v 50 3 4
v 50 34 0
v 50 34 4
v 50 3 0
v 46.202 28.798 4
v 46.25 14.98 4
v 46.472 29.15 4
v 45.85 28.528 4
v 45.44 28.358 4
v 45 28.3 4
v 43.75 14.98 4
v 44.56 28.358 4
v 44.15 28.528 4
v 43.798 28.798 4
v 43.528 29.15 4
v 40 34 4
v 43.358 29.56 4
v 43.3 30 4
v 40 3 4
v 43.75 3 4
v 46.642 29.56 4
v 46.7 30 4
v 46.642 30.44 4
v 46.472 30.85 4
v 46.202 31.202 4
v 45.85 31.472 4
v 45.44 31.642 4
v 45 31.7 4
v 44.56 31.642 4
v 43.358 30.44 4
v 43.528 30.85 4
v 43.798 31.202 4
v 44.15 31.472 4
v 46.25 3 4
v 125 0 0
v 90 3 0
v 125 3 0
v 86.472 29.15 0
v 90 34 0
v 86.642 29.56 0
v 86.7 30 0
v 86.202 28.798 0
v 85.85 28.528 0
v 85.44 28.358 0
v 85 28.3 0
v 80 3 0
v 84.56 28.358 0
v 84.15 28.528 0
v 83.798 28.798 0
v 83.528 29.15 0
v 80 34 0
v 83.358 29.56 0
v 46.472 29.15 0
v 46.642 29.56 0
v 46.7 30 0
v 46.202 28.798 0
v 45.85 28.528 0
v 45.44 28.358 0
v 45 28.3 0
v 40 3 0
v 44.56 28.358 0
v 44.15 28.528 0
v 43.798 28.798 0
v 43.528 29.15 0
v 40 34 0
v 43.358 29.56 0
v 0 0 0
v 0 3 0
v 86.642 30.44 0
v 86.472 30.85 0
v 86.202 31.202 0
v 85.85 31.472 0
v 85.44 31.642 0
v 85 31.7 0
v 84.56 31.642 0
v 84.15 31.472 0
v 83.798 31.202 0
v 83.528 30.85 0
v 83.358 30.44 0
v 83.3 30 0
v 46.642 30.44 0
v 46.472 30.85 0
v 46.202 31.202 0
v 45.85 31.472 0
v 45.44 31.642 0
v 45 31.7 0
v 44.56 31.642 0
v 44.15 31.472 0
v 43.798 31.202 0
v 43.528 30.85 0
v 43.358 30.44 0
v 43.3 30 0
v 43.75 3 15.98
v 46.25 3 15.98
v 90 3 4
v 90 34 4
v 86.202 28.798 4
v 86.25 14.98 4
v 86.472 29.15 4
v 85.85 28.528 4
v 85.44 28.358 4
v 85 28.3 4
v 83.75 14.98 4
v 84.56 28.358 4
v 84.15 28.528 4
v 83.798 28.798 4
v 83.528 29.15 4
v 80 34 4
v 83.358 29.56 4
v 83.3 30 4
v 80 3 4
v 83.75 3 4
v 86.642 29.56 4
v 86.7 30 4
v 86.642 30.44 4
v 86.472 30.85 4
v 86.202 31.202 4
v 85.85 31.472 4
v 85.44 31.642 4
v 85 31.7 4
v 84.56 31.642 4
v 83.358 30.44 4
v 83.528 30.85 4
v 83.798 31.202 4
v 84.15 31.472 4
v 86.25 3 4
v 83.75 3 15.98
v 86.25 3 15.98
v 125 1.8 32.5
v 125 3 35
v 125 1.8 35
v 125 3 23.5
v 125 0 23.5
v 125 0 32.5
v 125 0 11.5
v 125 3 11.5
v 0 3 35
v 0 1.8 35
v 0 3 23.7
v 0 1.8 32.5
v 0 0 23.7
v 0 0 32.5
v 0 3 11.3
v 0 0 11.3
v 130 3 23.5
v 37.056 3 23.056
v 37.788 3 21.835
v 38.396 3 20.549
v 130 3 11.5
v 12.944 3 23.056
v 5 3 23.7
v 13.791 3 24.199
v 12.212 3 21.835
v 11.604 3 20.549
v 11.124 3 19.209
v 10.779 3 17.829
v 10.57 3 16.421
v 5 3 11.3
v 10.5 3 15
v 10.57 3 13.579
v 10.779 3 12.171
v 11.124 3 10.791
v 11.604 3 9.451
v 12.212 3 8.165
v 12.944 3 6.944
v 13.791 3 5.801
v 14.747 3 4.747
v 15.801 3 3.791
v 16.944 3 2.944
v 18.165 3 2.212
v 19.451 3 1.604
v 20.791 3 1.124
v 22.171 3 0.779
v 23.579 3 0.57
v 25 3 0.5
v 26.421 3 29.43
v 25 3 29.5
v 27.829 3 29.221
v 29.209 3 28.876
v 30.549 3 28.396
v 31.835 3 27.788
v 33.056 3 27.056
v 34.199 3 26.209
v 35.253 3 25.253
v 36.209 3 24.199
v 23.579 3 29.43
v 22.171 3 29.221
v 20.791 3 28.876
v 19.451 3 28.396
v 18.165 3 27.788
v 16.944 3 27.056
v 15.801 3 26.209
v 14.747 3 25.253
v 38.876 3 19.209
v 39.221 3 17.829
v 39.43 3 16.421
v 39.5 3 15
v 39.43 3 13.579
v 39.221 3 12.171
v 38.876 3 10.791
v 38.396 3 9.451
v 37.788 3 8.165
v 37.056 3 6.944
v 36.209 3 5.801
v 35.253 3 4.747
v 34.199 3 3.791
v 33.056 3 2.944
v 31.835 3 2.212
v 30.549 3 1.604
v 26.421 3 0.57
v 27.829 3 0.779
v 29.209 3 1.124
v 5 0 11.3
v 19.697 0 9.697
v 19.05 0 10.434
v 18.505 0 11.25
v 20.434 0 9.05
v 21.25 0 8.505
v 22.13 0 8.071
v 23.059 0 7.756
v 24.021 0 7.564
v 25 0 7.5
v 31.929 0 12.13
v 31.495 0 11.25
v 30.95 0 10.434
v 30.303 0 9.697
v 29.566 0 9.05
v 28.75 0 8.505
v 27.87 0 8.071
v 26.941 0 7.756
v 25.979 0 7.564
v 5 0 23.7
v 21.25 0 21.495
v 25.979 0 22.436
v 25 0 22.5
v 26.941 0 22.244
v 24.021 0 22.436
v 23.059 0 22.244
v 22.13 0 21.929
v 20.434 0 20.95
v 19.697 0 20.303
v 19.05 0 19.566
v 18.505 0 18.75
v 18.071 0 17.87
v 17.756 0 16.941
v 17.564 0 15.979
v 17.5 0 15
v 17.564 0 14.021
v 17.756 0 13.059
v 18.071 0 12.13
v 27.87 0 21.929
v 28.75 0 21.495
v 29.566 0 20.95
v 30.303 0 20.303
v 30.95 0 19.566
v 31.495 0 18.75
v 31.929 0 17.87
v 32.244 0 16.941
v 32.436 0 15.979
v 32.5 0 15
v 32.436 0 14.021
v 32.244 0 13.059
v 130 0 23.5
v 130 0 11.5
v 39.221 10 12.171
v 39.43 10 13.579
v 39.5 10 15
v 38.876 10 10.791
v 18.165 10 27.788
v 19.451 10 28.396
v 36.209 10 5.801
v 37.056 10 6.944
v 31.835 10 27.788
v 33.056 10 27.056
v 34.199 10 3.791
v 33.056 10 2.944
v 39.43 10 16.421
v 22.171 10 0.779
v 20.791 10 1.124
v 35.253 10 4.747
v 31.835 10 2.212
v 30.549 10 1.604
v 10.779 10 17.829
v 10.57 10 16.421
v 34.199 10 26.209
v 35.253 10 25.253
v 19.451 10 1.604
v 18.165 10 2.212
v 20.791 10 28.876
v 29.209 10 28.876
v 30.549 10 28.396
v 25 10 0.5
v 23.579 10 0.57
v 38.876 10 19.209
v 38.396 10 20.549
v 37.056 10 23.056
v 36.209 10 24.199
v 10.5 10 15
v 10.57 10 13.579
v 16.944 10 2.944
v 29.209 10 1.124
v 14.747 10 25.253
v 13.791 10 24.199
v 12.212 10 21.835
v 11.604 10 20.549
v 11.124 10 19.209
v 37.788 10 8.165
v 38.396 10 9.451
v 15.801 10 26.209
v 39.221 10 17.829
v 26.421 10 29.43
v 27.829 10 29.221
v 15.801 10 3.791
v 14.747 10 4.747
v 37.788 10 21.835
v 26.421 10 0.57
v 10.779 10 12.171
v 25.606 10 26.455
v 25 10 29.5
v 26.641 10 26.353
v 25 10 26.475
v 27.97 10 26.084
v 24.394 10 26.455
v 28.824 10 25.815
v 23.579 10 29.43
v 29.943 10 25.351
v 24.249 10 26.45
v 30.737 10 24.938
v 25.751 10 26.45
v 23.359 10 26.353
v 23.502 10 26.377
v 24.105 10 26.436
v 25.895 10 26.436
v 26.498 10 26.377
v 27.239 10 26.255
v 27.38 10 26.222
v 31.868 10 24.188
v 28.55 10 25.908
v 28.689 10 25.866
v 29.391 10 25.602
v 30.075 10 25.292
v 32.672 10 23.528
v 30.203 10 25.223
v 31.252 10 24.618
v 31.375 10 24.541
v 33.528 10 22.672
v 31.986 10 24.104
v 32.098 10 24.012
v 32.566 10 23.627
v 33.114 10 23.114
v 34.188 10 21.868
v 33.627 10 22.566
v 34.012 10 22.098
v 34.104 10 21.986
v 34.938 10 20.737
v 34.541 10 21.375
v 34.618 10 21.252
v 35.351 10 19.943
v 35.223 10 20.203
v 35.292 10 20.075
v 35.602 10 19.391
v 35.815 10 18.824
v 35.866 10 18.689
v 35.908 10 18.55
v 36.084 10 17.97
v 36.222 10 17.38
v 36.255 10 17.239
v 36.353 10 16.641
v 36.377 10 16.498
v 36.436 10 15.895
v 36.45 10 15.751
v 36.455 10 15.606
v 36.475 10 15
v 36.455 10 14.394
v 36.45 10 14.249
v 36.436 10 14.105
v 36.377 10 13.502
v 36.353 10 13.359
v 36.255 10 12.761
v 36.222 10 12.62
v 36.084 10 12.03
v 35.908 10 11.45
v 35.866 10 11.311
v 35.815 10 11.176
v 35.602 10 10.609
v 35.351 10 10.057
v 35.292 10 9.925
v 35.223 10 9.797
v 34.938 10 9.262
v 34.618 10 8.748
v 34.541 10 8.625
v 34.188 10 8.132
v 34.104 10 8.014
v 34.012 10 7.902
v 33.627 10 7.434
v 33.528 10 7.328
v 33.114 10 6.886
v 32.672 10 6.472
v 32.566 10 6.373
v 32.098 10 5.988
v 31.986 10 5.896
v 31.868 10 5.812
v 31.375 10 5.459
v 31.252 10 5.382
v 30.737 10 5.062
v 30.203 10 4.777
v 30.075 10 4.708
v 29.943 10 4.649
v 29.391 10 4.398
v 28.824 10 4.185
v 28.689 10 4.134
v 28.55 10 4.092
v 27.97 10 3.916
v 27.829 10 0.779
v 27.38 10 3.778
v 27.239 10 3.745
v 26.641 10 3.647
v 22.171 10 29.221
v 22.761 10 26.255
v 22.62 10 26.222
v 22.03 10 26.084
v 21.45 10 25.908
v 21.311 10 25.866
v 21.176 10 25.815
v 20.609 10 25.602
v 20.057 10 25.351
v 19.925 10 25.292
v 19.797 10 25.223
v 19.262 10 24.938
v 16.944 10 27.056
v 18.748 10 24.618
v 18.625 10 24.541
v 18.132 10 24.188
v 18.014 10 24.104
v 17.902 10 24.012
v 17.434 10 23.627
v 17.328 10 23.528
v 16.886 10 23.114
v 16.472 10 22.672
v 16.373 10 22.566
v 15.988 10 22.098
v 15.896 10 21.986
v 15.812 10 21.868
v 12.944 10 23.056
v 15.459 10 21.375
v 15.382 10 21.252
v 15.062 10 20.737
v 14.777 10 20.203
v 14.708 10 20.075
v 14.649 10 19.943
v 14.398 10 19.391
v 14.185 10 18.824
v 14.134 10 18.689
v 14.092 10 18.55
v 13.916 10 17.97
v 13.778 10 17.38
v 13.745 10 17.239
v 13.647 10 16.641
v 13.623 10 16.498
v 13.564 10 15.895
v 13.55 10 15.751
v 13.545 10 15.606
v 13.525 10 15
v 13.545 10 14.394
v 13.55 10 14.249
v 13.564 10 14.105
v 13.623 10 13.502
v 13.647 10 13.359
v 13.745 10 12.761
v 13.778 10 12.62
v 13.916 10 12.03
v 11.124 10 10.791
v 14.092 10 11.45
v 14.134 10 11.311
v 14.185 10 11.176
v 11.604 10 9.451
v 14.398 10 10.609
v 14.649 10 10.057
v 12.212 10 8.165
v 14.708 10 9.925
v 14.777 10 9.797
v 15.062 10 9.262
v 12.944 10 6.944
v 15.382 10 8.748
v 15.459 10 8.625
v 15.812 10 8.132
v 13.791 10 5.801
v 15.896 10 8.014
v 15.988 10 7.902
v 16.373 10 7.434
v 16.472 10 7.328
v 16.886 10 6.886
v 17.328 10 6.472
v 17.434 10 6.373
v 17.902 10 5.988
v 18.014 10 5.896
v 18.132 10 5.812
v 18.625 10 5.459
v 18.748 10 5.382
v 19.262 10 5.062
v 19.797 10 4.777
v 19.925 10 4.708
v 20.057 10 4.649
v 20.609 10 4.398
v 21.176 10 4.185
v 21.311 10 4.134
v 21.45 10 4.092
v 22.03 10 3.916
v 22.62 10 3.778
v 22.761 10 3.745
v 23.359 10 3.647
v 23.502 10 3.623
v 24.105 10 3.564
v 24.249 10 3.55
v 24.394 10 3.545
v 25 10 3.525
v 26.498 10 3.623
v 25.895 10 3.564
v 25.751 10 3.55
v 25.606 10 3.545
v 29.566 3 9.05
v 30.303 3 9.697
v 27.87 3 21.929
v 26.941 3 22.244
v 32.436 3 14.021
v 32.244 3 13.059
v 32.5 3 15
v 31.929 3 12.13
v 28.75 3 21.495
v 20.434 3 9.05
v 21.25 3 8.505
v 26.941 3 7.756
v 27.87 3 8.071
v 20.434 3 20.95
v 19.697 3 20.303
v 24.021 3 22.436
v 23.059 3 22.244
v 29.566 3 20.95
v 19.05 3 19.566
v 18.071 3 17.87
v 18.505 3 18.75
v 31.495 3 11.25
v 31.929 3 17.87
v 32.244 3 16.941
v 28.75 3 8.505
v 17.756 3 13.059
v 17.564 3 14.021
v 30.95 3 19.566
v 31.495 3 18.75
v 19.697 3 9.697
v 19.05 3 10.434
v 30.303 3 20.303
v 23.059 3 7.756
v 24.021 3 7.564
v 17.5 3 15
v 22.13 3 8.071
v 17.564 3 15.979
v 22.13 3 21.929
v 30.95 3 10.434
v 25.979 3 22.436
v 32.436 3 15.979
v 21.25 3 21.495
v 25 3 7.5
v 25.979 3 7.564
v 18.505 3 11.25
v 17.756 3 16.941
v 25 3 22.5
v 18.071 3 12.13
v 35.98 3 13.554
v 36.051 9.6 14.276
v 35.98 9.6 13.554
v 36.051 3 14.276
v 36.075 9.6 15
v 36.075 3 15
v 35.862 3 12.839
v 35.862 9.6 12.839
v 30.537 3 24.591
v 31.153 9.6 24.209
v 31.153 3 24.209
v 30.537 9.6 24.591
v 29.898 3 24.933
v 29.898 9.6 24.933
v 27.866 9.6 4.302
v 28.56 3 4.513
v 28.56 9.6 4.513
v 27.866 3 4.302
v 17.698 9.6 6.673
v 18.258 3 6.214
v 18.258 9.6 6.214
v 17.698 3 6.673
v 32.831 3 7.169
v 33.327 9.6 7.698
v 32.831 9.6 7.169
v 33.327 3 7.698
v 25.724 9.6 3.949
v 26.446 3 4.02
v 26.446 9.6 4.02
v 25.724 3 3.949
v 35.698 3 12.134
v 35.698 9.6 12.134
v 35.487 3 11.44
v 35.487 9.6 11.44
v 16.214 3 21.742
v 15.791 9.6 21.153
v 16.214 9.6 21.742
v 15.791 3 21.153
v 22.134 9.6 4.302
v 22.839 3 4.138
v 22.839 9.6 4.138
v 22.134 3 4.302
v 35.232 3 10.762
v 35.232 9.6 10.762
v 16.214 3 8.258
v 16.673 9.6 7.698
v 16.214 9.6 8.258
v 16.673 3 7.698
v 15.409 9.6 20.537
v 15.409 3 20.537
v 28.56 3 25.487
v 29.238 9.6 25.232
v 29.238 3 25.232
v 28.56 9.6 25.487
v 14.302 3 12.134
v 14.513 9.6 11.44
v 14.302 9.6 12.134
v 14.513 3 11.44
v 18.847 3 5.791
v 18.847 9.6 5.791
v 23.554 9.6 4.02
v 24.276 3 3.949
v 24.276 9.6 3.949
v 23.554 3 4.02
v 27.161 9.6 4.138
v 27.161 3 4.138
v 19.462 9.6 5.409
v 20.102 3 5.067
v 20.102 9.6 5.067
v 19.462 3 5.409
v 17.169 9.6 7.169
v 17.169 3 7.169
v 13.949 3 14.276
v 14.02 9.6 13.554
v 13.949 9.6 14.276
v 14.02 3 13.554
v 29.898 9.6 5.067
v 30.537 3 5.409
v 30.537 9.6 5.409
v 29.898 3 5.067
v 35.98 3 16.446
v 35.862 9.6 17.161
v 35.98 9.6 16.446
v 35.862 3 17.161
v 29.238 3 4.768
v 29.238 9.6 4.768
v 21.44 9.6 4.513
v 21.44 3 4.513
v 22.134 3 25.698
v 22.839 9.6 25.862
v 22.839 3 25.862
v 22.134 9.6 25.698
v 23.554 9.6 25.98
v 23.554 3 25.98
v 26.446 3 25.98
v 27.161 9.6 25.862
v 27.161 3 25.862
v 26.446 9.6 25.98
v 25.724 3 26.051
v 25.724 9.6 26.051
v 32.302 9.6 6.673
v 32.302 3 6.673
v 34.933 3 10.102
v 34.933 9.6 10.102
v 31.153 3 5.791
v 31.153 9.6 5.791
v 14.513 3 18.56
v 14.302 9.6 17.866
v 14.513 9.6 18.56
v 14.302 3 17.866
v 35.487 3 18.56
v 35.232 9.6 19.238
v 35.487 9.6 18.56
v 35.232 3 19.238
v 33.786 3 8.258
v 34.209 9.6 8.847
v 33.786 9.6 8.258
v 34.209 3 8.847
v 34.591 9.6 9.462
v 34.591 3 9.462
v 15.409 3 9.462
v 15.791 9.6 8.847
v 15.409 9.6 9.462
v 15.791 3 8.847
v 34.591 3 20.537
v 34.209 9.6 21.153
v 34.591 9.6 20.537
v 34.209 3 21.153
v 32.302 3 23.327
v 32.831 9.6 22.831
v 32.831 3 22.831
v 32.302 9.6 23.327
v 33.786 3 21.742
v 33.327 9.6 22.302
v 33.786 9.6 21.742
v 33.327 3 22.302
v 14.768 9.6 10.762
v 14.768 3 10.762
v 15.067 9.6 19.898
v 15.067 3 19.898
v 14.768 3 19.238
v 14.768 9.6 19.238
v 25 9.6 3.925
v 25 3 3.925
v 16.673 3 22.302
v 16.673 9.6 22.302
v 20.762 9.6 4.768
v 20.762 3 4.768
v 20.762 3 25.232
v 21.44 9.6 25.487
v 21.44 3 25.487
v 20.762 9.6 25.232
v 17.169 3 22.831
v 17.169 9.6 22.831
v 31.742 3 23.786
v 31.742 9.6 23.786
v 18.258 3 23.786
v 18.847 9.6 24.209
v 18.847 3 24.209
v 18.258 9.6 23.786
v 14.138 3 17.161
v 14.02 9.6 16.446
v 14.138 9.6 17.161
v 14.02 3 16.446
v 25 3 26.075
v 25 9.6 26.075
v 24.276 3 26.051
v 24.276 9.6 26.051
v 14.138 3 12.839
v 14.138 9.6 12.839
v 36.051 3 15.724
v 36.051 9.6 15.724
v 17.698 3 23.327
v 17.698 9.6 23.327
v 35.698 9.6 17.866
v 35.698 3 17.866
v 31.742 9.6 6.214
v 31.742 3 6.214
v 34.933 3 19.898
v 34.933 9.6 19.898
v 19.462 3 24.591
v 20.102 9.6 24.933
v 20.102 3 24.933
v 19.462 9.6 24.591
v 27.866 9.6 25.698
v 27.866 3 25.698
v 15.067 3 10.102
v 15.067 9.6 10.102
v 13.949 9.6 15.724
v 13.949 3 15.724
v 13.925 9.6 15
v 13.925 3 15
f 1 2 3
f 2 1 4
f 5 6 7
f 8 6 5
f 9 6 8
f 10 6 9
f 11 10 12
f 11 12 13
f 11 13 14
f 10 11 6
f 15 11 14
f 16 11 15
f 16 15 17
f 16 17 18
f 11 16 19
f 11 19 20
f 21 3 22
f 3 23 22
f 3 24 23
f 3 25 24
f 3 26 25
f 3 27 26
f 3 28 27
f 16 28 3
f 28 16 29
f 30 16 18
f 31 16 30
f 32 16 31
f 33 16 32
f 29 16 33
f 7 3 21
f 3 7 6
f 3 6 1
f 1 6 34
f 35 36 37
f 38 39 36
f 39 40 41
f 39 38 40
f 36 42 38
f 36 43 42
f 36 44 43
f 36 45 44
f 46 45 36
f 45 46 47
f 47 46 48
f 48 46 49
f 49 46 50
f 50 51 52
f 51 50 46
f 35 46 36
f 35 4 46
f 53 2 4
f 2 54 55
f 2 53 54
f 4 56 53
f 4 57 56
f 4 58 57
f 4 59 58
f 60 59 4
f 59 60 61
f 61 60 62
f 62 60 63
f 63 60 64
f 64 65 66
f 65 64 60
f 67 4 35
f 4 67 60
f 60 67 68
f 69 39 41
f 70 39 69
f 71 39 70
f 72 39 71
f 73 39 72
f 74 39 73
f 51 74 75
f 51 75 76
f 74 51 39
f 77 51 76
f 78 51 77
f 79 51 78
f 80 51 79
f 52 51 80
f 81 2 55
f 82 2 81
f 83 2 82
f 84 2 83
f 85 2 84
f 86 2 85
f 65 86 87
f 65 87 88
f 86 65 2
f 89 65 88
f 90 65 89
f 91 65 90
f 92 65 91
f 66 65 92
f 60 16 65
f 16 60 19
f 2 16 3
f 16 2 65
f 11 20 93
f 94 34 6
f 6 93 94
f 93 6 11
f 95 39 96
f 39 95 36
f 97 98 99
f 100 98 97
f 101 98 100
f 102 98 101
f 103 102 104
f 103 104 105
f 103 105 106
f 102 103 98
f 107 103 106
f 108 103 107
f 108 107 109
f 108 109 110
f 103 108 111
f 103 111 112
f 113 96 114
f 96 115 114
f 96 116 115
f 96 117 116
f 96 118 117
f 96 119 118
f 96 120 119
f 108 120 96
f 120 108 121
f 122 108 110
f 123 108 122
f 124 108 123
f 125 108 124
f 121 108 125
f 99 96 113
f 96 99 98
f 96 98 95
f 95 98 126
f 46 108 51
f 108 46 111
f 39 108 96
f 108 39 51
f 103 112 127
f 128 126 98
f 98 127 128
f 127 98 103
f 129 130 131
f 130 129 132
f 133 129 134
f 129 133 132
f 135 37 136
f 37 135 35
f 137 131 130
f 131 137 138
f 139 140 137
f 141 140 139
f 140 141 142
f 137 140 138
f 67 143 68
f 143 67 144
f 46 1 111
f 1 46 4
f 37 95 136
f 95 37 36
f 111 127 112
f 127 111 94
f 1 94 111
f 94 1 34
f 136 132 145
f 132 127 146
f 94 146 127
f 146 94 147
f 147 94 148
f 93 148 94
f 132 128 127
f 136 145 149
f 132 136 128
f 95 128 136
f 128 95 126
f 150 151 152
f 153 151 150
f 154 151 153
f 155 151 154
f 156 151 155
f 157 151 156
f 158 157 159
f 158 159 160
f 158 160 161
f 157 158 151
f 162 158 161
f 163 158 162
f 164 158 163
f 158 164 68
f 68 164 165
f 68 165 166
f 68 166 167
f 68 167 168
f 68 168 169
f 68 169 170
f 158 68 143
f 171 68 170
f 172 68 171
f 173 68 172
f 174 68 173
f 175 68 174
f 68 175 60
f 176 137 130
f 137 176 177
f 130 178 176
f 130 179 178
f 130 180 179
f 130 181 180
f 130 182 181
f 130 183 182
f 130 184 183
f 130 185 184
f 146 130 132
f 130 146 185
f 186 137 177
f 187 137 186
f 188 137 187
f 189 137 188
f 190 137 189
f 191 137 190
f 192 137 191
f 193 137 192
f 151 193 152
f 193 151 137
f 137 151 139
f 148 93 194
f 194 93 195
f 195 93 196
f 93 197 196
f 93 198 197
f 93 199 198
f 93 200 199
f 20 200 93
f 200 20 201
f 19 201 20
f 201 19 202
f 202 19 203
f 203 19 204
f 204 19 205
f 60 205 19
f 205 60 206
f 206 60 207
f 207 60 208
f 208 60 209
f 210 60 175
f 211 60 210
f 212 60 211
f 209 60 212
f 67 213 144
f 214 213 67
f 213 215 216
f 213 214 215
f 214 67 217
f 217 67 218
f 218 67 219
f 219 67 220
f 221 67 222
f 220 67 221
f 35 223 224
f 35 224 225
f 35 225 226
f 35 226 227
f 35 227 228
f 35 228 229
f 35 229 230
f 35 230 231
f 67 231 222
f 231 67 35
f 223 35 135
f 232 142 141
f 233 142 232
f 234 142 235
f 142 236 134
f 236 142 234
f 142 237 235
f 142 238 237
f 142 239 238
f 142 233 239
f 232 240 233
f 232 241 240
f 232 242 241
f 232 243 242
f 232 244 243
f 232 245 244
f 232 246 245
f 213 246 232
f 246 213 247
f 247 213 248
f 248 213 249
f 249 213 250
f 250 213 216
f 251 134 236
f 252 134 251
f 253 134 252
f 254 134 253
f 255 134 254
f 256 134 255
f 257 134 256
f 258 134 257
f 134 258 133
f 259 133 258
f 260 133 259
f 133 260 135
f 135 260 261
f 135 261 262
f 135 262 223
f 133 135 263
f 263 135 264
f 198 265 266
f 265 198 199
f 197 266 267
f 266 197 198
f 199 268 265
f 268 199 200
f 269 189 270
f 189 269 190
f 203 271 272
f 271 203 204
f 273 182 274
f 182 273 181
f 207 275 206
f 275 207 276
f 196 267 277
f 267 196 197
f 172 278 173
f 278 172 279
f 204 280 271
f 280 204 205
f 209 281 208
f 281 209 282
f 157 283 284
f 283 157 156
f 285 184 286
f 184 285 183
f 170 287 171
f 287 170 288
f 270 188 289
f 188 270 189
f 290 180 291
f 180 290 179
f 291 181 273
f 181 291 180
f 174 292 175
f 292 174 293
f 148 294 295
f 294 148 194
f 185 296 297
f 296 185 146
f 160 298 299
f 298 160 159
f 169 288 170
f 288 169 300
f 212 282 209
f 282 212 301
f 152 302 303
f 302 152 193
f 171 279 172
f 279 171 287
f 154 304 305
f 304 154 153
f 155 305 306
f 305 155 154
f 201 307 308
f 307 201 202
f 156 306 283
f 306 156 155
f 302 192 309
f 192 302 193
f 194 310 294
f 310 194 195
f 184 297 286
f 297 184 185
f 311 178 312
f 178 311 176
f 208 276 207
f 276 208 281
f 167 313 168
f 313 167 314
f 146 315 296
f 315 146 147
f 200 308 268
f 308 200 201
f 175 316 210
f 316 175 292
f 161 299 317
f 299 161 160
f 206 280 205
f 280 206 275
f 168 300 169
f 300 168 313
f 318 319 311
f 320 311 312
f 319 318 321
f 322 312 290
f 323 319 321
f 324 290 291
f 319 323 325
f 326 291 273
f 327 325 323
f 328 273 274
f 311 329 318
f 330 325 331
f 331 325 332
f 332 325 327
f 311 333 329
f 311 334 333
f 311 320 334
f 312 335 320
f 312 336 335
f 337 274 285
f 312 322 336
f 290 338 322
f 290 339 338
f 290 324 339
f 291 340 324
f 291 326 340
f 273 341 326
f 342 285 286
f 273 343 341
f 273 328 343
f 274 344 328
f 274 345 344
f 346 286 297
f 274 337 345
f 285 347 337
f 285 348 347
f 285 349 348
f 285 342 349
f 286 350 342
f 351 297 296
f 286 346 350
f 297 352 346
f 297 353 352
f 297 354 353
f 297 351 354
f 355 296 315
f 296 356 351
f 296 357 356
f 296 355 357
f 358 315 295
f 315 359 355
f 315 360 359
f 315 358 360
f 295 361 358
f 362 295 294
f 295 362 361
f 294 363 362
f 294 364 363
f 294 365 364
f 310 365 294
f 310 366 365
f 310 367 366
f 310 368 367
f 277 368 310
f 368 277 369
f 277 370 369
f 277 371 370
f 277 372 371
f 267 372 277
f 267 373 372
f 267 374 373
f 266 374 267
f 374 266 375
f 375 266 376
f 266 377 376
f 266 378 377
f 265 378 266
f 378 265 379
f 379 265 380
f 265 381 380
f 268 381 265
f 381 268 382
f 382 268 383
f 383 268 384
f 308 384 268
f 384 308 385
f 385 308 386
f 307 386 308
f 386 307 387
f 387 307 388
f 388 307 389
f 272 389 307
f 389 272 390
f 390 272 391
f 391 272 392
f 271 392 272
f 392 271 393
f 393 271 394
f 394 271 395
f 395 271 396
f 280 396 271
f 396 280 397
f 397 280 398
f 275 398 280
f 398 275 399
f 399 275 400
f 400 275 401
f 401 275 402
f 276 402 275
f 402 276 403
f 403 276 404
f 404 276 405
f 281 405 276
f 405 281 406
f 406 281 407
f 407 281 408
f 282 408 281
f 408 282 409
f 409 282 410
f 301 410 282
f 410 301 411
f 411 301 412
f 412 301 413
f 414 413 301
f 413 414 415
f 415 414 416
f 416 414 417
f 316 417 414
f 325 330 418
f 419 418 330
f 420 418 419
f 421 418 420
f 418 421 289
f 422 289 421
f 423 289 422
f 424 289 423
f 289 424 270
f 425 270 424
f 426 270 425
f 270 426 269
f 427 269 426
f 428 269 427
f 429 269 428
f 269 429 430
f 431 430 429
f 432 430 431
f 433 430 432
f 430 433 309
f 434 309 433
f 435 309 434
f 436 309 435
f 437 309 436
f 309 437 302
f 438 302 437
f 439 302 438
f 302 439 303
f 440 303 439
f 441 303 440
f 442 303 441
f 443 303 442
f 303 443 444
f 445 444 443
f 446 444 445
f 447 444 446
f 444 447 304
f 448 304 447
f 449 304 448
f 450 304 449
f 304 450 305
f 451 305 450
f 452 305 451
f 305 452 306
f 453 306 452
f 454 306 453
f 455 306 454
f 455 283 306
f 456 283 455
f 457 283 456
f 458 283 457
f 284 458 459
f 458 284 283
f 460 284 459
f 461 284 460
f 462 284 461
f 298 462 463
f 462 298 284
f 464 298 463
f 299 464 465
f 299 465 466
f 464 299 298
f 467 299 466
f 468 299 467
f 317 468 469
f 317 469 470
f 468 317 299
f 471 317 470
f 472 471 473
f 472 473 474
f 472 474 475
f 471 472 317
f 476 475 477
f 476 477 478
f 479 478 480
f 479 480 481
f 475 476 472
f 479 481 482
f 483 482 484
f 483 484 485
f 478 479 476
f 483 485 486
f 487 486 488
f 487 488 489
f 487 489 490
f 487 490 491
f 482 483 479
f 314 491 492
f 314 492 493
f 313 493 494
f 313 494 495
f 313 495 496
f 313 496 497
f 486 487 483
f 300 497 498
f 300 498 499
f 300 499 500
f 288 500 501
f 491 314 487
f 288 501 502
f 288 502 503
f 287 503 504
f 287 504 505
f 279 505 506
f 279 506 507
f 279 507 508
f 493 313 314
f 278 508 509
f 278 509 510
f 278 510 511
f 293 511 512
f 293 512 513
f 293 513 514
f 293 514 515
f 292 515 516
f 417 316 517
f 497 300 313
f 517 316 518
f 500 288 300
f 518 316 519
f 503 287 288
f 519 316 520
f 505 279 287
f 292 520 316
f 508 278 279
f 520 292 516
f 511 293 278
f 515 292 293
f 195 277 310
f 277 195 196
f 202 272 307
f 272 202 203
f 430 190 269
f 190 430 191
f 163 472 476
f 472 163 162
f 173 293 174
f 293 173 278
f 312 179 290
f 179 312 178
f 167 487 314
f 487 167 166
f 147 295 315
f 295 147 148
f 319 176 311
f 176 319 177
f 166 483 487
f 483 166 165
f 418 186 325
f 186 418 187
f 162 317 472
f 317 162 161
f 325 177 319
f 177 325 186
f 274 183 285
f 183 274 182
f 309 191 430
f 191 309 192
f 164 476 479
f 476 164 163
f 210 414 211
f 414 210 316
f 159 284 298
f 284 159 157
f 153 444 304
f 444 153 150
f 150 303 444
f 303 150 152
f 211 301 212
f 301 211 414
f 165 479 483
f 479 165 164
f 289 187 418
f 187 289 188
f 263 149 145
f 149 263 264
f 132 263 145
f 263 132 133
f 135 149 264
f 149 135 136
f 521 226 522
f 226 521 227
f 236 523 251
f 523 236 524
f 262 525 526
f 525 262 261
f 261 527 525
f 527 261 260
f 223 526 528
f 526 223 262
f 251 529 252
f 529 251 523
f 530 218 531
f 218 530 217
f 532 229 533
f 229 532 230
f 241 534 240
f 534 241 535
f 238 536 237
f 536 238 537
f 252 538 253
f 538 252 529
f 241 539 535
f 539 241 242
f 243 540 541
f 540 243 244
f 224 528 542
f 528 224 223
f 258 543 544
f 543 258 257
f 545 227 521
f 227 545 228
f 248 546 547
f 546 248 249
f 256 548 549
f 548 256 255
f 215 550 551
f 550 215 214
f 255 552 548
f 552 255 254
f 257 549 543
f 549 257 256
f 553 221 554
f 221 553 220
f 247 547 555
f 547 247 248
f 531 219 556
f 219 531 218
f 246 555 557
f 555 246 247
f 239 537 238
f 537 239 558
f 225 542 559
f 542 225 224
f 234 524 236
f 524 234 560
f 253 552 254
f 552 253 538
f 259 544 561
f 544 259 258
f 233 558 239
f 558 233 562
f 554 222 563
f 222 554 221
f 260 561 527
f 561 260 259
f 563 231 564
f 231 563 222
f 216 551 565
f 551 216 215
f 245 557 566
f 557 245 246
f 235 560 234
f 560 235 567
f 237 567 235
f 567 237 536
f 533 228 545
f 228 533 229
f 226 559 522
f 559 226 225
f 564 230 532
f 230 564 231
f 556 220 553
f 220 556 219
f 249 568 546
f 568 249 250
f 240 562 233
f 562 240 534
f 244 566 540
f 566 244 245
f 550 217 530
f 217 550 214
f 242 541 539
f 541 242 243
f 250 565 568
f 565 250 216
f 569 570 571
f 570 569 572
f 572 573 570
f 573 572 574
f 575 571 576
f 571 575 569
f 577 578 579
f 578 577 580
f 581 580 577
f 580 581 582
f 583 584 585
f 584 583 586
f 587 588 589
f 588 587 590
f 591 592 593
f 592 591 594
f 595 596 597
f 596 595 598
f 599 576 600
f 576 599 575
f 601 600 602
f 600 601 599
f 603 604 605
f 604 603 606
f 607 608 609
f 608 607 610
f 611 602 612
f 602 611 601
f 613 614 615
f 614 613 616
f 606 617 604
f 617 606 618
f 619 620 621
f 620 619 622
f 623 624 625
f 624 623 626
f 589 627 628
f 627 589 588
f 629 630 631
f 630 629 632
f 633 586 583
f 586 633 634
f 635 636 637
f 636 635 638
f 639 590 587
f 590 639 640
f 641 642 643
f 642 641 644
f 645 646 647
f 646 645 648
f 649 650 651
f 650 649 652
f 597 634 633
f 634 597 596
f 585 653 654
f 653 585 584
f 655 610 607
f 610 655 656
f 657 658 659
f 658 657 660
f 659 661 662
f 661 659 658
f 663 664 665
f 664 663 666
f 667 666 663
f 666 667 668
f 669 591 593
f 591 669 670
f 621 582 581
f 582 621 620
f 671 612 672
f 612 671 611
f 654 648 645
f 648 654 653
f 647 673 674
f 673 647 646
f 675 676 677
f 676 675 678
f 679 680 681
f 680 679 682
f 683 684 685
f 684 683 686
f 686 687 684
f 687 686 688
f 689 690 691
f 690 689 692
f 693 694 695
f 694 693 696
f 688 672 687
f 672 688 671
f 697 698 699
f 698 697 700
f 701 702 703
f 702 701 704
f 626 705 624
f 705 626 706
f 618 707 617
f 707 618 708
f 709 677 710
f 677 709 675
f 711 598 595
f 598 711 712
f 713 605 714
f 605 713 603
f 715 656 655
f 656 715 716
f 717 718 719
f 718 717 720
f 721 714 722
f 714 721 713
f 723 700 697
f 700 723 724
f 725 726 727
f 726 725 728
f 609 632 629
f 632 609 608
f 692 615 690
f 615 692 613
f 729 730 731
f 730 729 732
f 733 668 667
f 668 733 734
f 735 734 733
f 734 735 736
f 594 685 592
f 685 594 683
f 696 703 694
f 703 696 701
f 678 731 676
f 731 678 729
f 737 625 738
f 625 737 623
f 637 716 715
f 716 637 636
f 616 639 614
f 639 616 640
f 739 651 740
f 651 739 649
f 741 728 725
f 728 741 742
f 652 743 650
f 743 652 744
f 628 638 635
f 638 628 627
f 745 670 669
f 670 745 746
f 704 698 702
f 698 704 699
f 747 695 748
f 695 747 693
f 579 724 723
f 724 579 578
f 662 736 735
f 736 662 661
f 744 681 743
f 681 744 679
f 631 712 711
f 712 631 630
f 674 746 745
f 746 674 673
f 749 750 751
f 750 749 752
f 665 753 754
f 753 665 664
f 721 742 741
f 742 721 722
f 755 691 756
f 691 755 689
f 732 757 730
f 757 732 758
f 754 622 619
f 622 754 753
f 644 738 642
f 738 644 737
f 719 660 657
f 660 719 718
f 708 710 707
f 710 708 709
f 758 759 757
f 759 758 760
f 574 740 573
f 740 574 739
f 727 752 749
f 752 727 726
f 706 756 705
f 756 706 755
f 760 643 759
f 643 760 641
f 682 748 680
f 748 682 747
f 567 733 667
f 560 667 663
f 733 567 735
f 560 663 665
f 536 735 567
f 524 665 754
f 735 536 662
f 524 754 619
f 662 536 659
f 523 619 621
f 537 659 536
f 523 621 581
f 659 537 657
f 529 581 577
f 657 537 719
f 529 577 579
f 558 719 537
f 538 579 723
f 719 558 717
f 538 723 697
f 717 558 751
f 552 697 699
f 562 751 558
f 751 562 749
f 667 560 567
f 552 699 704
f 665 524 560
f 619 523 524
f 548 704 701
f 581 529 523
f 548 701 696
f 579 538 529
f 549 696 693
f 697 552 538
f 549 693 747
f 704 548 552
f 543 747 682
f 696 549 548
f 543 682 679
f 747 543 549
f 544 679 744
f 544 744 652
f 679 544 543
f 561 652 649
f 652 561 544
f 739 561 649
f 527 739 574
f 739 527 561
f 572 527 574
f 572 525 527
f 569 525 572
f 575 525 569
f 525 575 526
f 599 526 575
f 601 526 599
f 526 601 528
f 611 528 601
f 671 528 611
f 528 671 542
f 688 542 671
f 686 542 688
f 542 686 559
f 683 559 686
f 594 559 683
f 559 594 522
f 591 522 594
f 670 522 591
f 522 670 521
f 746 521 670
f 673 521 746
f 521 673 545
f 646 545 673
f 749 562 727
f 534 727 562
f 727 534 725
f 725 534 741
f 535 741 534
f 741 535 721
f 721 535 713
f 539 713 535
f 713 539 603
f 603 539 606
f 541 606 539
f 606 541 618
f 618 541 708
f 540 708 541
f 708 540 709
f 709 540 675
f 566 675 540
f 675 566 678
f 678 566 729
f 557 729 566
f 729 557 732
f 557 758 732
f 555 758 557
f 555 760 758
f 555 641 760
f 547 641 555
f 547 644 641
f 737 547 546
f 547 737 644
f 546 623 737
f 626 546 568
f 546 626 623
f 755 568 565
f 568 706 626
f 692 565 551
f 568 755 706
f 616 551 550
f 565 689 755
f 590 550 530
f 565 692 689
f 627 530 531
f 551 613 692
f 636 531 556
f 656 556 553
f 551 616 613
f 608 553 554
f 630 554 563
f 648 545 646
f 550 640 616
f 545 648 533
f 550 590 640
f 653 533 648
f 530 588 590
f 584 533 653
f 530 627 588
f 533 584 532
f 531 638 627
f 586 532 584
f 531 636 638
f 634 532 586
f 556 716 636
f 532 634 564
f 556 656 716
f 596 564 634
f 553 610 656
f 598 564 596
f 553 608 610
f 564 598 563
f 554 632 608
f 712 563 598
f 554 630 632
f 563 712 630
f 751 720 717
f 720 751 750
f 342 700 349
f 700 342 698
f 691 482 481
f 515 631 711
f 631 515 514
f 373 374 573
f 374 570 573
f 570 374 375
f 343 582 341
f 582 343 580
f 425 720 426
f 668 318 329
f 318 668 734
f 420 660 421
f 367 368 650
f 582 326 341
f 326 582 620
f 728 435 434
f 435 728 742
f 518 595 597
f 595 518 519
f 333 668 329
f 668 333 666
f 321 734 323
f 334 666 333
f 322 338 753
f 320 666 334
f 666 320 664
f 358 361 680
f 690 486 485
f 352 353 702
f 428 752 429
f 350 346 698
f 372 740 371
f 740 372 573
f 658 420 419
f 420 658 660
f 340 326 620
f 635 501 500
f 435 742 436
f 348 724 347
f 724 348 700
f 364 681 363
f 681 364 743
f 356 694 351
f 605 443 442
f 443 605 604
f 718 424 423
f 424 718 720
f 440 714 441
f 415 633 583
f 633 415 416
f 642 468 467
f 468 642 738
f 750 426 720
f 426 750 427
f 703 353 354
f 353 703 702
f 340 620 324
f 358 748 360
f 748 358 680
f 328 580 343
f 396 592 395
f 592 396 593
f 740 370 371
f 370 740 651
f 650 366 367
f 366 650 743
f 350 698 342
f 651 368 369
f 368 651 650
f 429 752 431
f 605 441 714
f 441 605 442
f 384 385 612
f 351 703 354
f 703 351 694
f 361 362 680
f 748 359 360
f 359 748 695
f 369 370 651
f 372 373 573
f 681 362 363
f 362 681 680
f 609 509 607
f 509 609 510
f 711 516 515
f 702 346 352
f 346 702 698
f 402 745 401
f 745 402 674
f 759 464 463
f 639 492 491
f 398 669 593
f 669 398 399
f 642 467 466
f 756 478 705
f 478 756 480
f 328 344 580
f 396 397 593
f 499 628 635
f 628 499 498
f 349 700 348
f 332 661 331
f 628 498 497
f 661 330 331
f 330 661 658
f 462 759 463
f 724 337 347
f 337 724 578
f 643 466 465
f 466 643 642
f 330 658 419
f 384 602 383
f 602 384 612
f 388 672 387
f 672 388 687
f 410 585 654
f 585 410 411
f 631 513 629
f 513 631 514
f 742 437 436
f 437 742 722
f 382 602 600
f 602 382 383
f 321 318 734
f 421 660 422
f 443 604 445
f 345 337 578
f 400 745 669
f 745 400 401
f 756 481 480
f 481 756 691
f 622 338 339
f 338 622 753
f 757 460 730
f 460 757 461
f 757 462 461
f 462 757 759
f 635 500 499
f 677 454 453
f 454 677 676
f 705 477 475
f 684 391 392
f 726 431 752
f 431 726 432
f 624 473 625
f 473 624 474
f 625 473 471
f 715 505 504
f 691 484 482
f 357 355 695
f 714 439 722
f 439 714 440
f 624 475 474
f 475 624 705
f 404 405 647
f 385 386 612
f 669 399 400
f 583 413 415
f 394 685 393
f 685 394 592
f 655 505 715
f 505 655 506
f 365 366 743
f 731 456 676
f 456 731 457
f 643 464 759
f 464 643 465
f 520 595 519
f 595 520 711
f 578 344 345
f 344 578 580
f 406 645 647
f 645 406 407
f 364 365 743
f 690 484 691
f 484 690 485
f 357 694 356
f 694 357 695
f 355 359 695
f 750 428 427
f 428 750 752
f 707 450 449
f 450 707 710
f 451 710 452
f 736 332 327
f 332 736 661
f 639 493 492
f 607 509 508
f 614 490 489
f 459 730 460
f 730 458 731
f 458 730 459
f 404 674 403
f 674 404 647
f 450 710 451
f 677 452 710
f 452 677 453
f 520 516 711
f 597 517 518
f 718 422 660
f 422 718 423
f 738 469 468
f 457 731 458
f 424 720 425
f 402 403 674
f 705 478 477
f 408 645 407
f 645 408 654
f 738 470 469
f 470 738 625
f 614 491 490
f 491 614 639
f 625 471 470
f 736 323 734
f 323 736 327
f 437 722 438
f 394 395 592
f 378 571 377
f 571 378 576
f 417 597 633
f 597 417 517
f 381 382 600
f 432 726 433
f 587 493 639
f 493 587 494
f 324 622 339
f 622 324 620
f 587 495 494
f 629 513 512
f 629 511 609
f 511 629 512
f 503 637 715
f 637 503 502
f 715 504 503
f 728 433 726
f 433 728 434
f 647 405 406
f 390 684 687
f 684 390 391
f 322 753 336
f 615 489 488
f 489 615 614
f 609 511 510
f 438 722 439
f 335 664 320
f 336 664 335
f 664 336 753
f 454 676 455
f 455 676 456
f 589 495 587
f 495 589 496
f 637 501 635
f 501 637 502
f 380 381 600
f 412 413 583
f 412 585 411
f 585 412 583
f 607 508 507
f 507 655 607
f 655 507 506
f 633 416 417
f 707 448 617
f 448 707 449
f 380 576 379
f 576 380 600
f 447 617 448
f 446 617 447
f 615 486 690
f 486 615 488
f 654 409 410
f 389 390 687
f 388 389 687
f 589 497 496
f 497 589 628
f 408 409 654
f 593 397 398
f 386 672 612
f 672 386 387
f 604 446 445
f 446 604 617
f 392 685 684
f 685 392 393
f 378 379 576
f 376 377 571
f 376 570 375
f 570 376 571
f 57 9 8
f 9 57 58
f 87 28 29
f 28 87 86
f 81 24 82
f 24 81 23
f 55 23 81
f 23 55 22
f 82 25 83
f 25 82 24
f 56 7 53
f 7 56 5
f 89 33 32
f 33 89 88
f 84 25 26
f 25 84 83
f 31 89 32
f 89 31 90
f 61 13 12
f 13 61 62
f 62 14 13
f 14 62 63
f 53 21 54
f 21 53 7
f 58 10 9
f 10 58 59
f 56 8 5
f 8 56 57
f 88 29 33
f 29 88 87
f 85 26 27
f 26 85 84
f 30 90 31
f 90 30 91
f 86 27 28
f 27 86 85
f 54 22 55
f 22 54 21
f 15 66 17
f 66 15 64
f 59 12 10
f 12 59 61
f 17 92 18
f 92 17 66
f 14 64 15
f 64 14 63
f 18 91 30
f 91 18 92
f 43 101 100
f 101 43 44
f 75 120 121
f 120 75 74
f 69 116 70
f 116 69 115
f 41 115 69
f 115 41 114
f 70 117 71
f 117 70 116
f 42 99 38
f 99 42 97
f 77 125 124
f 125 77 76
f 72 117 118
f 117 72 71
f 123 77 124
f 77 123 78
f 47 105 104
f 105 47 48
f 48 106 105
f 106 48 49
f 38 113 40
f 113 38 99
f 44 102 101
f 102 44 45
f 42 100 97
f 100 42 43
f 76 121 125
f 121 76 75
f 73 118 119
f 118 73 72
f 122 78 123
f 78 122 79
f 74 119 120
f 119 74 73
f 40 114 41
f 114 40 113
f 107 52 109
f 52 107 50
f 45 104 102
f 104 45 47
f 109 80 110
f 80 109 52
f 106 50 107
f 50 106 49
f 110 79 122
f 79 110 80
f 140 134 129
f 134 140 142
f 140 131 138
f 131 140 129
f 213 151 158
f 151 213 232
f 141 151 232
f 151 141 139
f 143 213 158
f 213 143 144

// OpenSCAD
// =============================================
// Riftbound Card Sorter — Conveyor Side Rail
// =============================================
// 4 prints: 2 rail lines (front -Y = motor side, back +Y = plain), each
// split into 2 × 125mm halves for the P1S bed. Halves join by tenon/mortise.
// Material: PLA, 0.2mm layers, 40% infill, 4 walls
//
// Local frame (as modelled): x = along the rail (belt travel), y = 0 on the
// INNER face, +y outward, z = 0 on the baseplate. In assembly.scad the back
// rail is placed as-is at Y = +45, the front rail mirrored in Y at Y = -45.
// Export the front halves with `part = "front1"/"front2"` (already mirrored).
//
// Drivetrain (see motor_mount.scad):
//   Two 8mm rods, one per roller: near shaft (half 1, x=25) and far shaft
//   (half 2, x=100). BOTH are driven — one N20 per rod, L9110S ch A/B
//   (hardware/conveyor.py). Both motors sit on the front (-Y) rail, so only
//   that rail's halves are printed with motor_mount = true.
//
// 608ZZ bearing housing (one per shaft station, 4 total):
//   boss Ø29 × 7.0 on the outer face, with a Ø22.15 × 7.0 press-fit pocket
//   OPEN TO THE OUTSIDE. The 3mm rail wall is the pocket floor = shoulder:
//   its through-hole is Ø15, i.e. bigger than the 608 inner-ring land
//   (≈Ø12.1, so the rotating inner ring never touches plastic) and smaller
//   than the outer-ring land (≈Ø19.5, so the outer ring is fully backed and
//   cannot be pushed through to the card side). The bearing sits flush with
//   the boss face; it is retained from outside by the motor-mount flange
//   (front) and by the rod collars (both sides, via the inner ring).
//
//   inner face │ 3.0 wall (shoulder, Ø15 hole) │ 7.0 pocket = 608ZZ │ boss face
//   y = 0                                  y = 3                     y = 10
// =============================================

/* [Export] */
part = "back1";   // back1 | back2 | front1 | front2

// Parameters
rail_len    = 125;    // half-length (split for P1S bed); total = 250mm
rail_h      = 35;
wall        = 3.0;
card_h      = 88;     // Riftbound card length (along X)

// Card-guide seat groove (top of the inner face). card_guide.scad hangs its
// groove fill in it (fill rests on the groove floor, local Z 32.5 = machine
// 96.5). The groove is 2.5 tall but only 1.8 deep into the 3 mm wall, so the
// fin left along the rail top is 1.2 mm thick (was 0.5 × 2.5 with a 2.5 deep
// groove: one perimeter, and the hood seat + clip jaws bear on it).
groove_depth = 2.5;          // vertical (Z) height of the groove
groove_y     = 1.8;          // horizontal depth into the wall → fin wall - groove_y = 1.2
assert(wall - groove_y >= 1.2 - 1e-6, "rail-top fin thinner than 1.2 mm");

// Roller shafts
shaft_y      = 15;    // rod axis height above the rail base
shaft_x1     = 25;    // near shaft (first half piece)
shaft_x2     = 100;   // far shaft (second half piece)

// 608ZZ: d 8 × D 22 × B 7. Inner-ring land ≈ Ø12.1, outer-ring land ≈ Ø19.5
brg_od       = 22.0;
brg_w        = 7.0;
pocket_d     = 22.15; // press fit in PLA/PETG; tune ±0.05 to your printer
pocket_depth = 7.0;   // = bearing width → bearing flush with boss face
pocket_chamf = 0.4;   // lead-in chamfer at the pocket mouth
shoulder_d   = 15.0;  // through-hole in the wall (shoulder ID)
boss_d       = 29.0;  // housing OD → 3.4mm radial wall around the pocket
boss_h       = pocket_depth;   // boss protrudes 7.0 past the 3mm wall

// Motor-mount fastening (front rail only). 2× M3 brass heat-set inserts per
// shaft in Ø9 pads, coplanar with the boss face (pads merge into the boss).
// Hole Ø4.1 for M3 inserts (Ruthex/CNC Kitchen M3×5.7 → Ø4.0, generic
// M3×5×4.5 → Ø4.2); blind, stops 1mm short of the inner (card) face.
// Insert centres sit 17.5mm from the shaft: hole edge r 15.45 is 0.95mm
// outside the Ø29 boss outline and leaves 4.4mm of plastic to the pocket.
mm_screw_dx     = 15.0;   // ± X from shaft centre
mm_screw_dz     = 9.0;    // + Z above shaft centre
mm_pad_d        = 9.0;
mm_insert_d     = 4.1;
mm_insert_depth = wall + boss_h - 1.0;   // 9.0mm blind, from pad face

// Riser-deck fastening — L-feet on the OUTER face, M3 through the foot into
// the riser (see FEET at the bottom for lengths). The tile M3 grid
// (baseplate_tile.scad, 30mm pitch) has a row at |Y| = 75 (and at 45, which
// is exactly the rail inner face, so unusable); feet reach out to it.
foot_t       = 4.0;          // foot plate thickness (Z)
foot_w       = 10.0;         // along X
foot_hole_y  = 75 - 45;      // 30: grid row |Y|=75 minus rail_in
foot_len     = foot_hole_y + 4;   // foot ends at |Y| = 79 (electronics tray at 80)
foot_hole_d  = 3.4;
foot_gusset  = 12.0;         // gusset legs (y and z), centre web 2.5 thick
// Foot positions in local x (machine X = local + -165 for half 1, + -40 for
// half 2), chosen on the 30mm grid and clear of: motor brackets (front, X
// -161..-119 and 39..81), camera-bracket foot (back, X -65..-15), collars.
//   front: X -80, -50 | -20, 10      back: X -120, -80 | 10, 40
function rail_feet_x(far, front) =
    front ? (far ? [20, 50] : [85, 115])
          : (far ? [50, 80] : [45, 85]);

// ── Shared geometry for other parts (motor_mount / slide_bed `use` these) ──
function rail_wall()            = wall;
function rail_boss_h()          = boss_h;
function rail_boss_d()          = boss_d;
function rail_boss_face_y()     = wall + boss_h;          // 10.0 from inner face
function rail_pocket_d()        = pocket_d;
function rail_shoulder_d()      = shoulder_d;
function rail_shaft_y()         = shaft_y;
function rail_shaft_x(far)      = far ? shaft_x2 : shaft_x1;
function rail_mm_screw_offsets() = [[-mm_screw_dx, mm_screw_dz],
                                    [ mm_screw_dx, mm_screw_dz]];
function rail_foot_hole_y()     = foot_hole_y;
function rail_groove()          = [groove_y, groove_depth];   // [depth into wall, height]

echo(str("RAIL: 608 pocket Ø", pocket_d, " × ", pocket_depth, ", boss Ø", boss_d,
         ", shoulder hole Ø", shoulder_d, "; insert hole edge r = ",
         norm([mm_screw_dx, mm_screw_dz]) - mm_insert_d / 2,
         " (boss r ", boss_d / 2, ", pocket r ", pocket_d / 2, ")"));
assert(norm([mm_screw_dx, mm_screw_dz]) - mm_insert_d / 2 > boss_d / 2,
       "insert hole breaks into the boss outline");
assert(shoulder_d > 12.5 && shoulder_d < 19, "shoulder must clear inner ring, back outer ring");
assert(shaft_y - boss_d / 2 >= 0, "boss below the baseplate");

// One bearing boss (+ optional motor-mount insert pads) at x = sx
module shaft_station_add(sx, motor_mount) {
    translate([sx, wall - 0.01, shaft_y])
        rotate([-90, 0, 0])
        cylinder(d = boss_d, h = boss_h + 0.01, $fn = 64);
    if (motor_mount)
        for (o = rail_mm_screw_offsets())
            translate([sx + o[0], wall - 0.01, shaft_y + o[1]])
                rotate([-90, 0, 0])
                cylinder(d = mm_pad_d, h = boss_h + 0.01, $fn = 32);
}

module shaft_station_cut(sx, motor_mount) {
    // Shoulder through-hole in the wall
    translate([sx, -0.1, shaft_y])
        rotate([-90, 0, 0])
        cylinder(d = shoulder_d, h = wall + 0.2, $fn = 48);
    // 608ZZ pocket, open to the outside
    translate([sx, wall, shaft_y])
        rotate([-90, 0, 0])
        cylinder(d = pocket_d, h = pocket_depth + 0.1, $fn = 96);
    // Lead-in chamfer at the mouth
    translate([sx, wall + boss_h - pocket_chamf, shaft_y])
        rotate([-90, 0, 0])
        cylinder(d1 = pocket_d, d2 = pocket_d + 2 * pocket_chamf + 0.2,
                 h = pocket_chamf + 0.1, $fn = 96);
    // M3 heat-set insert holes, blind from the pad face toward the inner face
    if (motor_mount)
        for (o = rail_mm_screw_offsets())
            translate([sx + o[0], wall + boss_h + 0.1, shaft_y + o[1]])
                rotate([90, 0, 0])
                cylinder(d = mm_insert_d, h = mm_insert_depth + 0.1, $fn = 24);
}

module rail_foot(fx) {
    translate([fx - foot_w / 2, wall - 0.01, 0])
        cube([foot_w, foot_len - wall + 0.01, foot_t]);
    // centre gusset web (stops short of the screw head)
    translate([fx - 1.25, wall - 0.01, foot_t - 0.01])
        rotate([90, 0, 90])
        linear_extrude(2.5)
        polygon([[0, 0], [foot_gusset, 0], [0, foot_gusset]]);
}

module rail_foot_cut(fx)
    translate([fx, foot_hole_y, -0.1])
        cylinder(d = foot_hole_d, h = foot_t + 0.2, $fn = 24);

// add_shaft_near defaults to !add_shaft_far: half 1 carries only the near
// shaft (x=25), half 2 only the far shaft (x=100).
// motor_mount = true → front-rail variant: insert pads + front foot layout.
module rail_half(add_shaft_far = false, add_shaft_near = undef, motor_mount = false,
                 feet = undef) {
    near  = is_undef(add_shaft_near) ? !add_shaft_far : add_shaft_near;
    feetx = is_undef(feet) ? rail_feet_x(add_shaft_far, motor_mount) : feet;
    difference() {
        union() {
            // Rail body
            cube([rail_len, wall, rail_h]);

            // 608ZZ housing(s) on the outer face
            if (near)          shaft_station_add(shaft_x1, motor_mount);
            if (add_shaft_far) shaft_station_add(shaft_x2, motor_mount);

            // Baseplate feet
            for (fx = feetx) rail_foot(fx);

            // Tenon protruding 5mm from right face, mates with next piece's mortise
            translate([rail_len, 0, rail_h / 2 - 6])
                cube([5, wall, 12]);
        }

        // Card guide groove (inner face, top)
        translate([-0.1, -0.1, rail_h - groove_depth])
            cube([rail_len + 0.2, groove_y + 0.1, groove_depth + 0.1]);

        if (near)          shaft_station_cut(shaft_x1, motor_mount);
        if (add_shaft_far) shaft_station_cut(shaft_x2, motor_mount);

        for (fx = feetx) rail_foot_cut(fx);

        // Mortise at left face (x=0), 0.2mm clearance all sides
        translate([-0.1, -0.2, rail_h / 2 - 6.2])
            cube([5.1, wall + 0.4, 12.4]);
    }
}

if (part == "back1")  rail_half(add_shaft_far = false);
if (part == "back2")  rail_half(add_shaft_far = true);
if (part == "front1") mirror([0, 1, 0]) rail_half(add_shaft_far = false, motor_mount = true);
if (part == "front2") mirror([0, 1, 0]) rail_half(add_shaft_far = true,  motor_mount = true);

// =============================================
// PRINT ORIENTATION: inner face on the bed (bosses and feet pointing up),
//   so each 608 pocket is a vertical blind hole open at the top.
//   front1/front2 are exported pre-mirrored — do NOT mirror in the slicer.
// SUPPORTS: none (foot holes Ø3.4 and insert holes Ø4.1 print horizontal)
// BEARINGS: press the 608ZZ in with a vise/flat block on the OUTER ring
//   only, until it seats on the shoulder (flush with the boss face).
// HEAT-SET INSERTS (front rail only): 4× M3, pressed in from the pad face
//   with a soldering iron at ~220°C, flush with the pad face.
// FEET: 8 total (4 per rail line). The rails stand on the riser deck
//   (riser.scad), not on the baseplate, so a foot screw either goes through
//   the whole riser or into a deck insert:
//   - through-feet front X −80, back X −120 / −80 / +10: clamp = foot 4 +
//     riser 60 + tile 4 + 6 mm backing board = 74 → M3 × 80 (or 85 mm M3
//     threaded rod), washer + nut under the board (6 mm left for 0.5 washer
//     + 2.4 nut + thread).
//   - insert feet front X −50, back X +40: M3 × 10 into the deck's M3 × 5.7
//     heat-set insert. Front X −20 / +10 also carry the camera bracket foot
//     (6 mm): M3 × 16 there (the insert has a 14 mm relief below).
// =============================================
